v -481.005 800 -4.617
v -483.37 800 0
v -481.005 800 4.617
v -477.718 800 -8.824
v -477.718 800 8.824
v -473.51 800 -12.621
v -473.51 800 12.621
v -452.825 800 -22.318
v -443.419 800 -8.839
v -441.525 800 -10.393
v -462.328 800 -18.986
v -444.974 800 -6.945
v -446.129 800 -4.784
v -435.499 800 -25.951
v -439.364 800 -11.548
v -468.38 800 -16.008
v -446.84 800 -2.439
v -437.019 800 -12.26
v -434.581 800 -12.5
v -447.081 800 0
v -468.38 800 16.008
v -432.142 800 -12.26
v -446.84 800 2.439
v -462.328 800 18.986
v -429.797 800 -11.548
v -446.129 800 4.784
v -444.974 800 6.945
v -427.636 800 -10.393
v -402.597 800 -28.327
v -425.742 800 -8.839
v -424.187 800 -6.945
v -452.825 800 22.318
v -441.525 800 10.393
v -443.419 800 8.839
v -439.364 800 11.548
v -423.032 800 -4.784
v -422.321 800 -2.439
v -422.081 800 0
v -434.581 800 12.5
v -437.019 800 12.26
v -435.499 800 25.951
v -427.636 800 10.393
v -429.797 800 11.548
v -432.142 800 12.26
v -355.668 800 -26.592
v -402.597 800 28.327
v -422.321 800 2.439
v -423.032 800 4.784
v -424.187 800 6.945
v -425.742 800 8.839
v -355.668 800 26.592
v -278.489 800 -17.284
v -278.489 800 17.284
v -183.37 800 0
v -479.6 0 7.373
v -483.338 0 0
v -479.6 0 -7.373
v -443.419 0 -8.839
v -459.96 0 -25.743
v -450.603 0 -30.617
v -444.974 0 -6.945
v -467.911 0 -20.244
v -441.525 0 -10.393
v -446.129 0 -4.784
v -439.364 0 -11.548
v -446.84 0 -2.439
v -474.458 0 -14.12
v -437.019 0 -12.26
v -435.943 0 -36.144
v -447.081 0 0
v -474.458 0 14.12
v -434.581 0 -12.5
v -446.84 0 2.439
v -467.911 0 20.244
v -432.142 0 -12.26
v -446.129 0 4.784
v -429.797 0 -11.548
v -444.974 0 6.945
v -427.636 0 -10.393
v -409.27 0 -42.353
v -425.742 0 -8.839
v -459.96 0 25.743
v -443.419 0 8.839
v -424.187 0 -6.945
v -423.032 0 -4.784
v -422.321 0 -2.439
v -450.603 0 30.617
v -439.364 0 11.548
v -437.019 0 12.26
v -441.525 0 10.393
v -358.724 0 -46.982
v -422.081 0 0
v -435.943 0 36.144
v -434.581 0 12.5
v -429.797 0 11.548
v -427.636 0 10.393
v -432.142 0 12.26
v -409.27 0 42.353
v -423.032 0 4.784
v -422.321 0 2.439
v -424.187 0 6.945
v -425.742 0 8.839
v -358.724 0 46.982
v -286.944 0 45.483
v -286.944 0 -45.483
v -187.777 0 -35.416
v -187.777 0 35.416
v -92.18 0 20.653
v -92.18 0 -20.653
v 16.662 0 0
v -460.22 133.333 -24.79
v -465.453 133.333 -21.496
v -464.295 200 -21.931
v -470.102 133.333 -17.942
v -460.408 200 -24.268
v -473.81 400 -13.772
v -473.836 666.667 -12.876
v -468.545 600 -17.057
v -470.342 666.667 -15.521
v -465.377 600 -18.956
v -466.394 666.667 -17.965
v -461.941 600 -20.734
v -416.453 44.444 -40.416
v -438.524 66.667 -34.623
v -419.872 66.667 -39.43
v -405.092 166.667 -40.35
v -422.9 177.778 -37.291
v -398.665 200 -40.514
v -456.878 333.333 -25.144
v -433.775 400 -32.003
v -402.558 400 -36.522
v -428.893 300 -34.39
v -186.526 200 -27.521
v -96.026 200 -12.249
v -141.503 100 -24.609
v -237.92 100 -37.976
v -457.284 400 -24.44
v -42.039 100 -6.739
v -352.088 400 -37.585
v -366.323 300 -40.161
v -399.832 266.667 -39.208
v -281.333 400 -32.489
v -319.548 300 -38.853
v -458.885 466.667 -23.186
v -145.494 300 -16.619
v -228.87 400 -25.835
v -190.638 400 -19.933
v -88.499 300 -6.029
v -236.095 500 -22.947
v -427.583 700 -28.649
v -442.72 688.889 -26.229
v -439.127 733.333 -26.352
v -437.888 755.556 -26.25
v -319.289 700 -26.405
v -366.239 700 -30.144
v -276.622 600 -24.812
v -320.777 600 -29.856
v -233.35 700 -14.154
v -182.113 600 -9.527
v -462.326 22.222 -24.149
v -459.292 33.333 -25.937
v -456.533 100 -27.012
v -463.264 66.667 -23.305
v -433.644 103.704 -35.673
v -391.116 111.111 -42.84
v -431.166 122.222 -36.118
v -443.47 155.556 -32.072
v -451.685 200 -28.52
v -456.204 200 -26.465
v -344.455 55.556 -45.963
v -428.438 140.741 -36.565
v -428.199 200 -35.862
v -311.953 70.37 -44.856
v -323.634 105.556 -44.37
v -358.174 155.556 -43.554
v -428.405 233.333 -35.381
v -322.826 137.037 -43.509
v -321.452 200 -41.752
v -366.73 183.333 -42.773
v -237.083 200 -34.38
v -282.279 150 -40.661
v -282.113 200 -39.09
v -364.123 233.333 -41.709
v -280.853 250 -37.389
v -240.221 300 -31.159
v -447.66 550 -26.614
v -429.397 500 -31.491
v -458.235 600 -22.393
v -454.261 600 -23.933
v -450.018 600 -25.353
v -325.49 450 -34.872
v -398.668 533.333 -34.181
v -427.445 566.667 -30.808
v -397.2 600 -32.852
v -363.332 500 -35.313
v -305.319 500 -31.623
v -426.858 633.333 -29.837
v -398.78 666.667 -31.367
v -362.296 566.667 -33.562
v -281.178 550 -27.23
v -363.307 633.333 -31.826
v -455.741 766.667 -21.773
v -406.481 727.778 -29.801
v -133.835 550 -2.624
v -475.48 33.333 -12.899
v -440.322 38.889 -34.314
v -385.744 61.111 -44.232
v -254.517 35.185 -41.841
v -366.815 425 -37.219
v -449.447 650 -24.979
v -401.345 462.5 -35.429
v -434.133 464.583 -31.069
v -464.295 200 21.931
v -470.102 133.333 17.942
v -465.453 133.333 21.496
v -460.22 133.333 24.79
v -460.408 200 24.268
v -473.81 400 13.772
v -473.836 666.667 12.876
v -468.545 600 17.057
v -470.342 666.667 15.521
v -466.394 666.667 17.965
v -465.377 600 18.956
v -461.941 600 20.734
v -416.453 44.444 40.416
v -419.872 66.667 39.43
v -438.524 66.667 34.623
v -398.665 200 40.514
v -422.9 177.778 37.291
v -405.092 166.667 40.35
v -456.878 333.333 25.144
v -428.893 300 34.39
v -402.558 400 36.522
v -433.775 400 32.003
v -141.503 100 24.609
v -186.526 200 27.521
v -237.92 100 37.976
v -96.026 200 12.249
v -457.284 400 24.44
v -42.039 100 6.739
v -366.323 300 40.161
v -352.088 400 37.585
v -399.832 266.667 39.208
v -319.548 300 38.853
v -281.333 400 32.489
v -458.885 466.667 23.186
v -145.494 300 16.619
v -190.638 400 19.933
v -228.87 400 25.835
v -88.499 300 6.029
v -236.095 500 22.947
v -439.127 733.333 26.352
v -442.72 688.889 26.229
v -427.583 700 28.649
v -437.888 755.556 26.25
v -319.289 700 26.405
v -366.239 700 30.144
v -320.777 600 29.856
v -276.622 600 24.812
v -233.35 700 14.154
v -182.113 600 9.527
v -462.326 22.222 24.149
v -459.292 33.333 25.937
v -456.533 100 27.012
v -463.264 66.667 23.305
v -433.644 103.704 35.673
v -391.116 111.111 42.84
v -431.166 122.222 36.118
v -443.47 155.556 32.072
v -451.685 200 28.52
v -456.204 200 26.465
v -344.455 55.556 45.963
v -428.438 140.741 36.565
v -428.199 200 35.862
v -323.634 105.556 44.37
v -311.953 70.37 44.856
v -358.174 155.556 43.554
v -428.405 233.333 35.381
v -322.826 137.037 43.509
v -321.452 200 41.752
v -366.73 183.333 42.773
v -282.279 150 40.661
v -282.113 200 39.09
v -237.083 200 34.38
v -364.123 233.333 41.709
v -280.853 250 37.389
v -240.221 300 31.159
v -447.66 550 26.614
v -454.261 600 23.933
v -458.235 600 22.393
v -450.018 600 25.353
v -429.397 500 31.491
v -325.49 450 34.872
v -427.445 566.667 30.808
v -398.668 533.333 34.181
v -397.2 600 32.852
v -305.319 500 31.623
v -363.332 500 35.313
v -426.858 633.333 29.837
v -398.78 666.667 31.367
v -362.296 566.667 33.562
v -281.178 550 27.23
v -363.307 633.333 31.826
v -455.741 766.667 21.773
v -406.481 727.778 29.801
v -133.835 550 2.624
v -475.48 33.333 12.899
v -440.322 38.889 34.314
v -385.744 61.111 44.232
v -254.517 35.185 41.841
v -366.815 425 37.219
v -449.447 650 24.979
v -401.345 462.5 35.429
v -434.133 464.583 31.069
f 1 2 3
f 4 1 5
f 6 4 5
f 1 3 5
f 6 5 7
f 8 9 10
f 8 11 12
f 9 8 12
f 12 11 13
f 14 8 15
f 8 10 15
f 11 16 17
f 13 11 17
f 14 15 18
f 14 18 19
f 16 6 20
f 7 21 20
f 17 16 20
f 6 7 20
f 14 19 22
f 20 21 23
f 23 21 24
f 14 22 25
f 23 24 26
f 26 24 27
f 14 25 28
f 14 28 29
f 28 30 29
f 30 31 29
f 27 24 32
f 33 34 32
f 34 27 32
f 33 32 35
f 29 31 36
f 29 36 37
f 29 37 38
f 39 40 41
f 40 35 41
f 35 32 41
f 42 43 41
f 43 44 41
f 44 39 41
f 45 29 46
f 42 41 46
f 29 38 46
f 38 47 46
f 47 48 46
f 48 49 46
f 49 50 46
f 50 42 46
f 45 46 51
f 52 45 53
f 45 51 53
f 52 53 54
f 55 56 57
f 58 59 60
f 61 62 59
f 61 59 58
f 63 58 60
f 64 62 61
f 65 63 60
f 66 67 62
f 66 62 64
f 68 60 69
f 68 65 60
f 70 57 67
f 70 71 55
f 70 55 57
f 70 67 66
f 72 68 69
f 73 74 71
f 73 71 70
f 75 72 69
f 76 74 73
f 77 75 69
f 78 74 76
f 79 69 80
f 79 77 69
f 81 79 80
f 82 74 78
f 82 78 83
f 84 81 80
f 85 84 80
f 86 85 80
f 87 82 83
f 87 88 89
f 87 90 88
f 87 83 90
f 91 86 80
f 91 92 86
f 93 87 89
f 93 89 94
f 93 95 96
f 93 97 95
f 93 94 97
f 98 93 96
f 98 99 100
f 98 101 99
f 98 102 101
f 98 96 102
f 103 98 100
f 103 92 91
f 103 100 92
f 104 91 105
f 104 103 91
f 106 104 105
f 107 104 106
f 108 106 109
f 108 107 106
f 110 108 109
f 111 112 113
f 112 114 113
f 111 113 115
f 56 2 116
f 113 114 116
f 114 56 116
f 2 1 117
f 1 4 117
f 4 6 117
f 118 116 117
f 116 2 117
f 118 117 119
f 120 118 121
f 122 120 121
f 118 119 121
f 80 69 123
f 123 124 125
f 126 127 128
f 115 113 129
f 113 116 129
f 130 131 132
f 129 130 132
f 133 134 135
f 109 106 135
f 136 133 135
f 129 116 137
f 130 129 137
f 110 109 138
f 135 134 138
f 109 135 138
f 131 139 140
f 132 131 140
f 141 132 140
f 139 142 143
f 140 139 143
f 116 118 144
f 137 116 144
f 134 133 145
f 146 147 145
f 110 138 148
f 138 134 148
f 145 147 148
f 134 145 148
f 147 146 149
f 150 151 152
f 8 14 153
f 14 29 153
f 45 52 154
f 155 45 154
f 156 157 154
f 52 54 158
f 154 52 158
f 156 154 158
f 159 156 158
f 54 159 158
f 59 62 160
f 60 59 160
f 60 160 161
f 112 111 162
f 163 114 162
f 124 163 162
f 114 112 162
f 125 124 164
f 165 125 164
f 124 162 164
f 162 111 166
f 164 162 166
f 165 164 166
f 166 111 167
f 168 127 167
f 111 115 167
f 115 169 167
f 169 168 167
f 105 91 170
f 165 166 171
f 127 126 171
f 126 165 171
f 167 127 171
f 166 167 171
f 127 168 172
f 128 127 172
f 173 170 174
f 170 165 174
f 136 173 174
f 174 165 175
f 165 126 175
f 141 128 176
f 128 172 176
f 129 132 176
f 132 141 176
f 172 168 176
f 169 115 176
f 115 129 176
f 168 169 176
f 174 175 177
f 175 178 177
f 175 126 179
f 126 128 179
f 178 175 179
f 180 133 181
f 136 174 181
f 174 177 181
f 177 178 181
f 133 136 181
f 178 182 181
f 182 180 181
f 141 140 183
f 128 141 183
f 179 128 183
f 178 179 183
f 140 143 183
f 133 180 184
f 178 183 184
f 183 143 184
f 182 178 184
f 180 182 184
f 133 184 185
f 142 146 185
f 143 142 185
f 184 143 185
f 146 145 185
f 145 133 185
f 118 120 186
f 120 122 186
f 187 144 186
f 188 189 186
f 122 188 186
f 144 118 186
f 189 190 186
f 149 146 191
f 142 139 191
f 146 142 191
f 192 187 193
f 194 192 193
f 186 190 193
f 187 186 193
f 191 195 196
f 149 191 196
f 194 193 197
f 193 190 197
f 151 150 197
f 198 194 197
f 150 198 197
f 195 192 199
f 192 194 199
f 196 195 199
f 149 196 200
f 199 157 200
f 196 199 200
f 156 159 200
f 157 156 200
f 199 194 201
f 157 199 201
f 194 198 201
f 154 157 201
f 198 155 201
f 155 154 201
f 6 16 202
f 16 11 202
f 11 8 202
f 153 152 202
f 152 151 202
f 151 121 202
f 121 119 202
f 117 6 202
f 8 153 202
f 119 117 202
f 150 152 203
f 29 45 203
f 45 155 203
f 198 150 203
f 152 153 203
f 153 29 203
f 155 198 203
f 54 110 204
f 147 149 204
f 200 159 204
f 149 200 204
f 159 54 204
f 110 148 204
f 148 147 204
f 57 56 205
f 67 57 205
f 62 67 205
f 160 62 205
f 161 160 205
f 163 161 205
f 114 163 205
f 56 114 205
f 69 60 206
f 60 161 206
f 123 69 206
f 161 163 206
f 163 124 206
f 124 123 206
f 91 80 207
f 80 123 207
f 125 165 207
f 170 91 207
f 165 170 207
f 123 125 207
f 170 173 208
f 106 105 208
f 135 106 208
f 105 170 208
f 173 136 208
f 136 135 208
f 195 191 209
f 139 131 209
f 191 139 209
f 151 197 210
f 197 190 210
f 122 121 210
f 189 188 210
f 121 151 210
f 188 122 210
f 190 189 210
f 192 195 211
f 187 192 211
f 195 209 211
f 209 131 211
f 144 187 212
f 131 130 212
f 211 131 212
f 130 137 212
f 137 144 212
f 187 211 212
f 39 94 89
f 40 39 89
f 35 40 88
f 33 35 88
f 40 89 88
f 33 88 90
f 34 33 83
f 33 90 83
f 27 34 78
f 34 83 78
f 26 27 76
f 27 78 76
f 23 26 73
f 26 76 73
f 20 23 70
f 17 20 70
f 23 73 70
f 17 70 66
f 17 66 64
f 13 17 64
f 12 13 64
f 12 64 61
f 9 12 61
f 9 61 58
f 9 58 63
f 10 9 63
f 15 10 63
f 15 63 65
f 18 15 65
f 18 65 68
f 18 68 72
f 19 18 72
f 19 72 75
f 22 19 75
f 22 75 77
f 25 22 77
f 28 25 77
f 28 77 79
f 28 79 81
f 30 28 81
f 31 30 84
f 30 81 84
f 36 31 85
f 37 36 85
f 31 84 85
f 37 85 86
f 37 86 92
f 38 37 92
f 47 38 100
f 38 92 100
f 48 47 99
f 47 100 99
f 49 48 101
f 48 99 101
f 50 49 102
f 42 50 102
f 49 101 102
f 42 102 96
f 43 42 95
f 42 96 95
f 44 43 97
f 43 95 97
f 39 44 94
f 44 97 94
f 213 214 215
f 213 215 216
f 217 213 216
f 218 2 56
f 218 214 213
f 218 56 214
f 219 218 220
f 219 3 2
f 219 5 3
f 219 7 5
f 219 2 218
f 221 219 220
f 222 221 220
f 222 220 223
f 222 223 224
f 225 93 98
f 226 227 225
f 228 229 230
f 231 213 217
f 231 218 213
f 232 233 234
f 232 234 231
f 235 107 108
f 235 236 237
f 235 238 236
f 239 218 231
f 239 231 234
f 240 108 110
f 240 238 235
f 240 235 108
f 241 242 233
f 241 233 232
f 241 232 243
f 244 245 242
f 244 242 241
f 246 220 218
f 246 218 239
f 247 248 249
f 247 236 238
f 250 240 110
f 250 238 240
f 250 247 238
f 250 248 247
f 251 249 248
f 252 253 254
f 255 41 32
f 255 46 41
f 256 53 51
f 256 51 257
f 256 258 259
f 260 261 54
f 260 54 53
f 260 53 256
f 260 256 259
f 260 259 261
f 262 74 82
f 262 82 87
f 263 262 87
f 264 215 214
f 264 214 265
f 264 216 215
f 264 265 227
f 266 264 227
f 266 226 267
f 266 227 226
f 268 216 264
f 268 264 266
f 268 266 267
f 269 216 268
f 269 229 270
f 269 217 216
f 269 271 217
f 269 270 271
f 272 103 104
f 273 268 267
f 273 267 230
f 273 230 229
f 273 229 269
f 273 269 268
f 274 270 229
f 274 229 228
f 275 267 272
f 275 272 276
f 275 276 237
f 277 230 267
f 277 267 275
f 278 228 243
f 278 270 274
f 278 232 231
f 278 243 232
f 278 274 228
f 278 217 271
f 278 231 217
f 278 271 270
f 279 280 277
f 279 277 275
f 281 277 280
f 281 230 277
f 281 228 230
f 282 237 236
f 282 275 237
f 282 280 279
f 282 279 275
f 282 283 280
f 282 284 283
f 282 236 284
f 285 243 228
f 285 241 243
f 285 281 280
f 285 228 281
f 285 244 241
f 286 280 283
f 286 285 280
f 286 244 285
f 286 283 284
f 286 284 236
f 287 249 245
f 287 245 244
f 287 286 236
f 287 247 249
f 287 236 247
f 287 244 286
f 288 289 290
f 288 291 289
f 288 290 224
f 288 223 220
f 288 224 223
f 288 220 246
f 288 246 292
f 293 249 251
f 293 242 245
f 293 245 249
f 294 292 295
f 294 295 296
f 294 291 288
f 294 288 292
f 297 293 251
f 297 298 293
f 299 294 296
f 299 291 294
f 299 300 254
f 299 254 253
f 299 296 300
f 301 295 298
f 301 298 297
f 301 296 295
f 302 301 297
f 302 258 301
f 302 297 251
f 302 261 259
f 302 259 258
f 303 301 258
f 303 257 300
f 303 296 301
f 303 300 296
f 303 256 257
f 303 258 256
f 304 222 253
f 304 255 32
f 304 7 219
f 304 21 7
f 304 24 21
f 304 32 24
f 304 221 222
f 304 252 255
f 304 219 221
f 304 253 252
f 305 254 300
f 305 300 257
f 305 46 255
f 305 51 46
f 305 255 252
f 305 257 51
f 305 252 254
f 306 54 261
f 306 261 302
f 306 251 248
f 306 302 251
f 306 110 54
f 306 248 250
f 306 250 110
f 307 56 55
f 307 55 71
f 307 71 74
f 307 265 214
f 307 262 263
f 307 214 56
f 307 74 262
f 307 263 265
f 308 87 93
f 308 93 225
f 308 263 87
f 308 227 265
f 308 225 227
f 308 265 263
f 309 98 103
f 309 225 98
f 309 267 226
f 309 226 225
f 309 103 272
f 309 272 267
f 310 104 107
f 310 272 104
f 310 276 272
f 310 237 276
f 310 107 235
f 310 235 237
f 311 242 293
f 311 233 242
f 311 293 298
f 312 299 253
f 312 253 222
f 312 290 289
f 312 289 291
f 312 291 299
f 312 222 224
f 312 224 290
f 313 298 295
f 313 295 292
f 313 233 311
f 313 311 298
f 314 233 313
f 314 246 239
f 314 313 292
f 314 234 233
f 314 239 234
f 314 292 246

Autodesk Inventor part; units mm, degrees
ref_plane "YZ Plane" through (0, 0, 0) normal (1, 0, 0) x (0, 1, 0)
ref_plane "XY Plane" through (0, 0, 0) normal (0, 0, 1) x (1, 0, 0)
sketch "ground" plane through (0, 0, 0) normal (0, 1, 0) x (-1, 0, 0)
  line L0 (483.3377, 0) -> (445.9963, 94.5527) construction
  line L1 (445.9963, 94.5527) -> (-16.6623, 0) construction
  spline S0 degree 2 poles (483.3377, 0) (445.9963, 94.5527) (-16.6623, 0) knots 1 1 1 2 2 2
  line L2 (483.3377, 0) -> (-16.6623, 0)
  point P0 (0, 0)
  dimension "d0" = 500
  dimension "d21" = 100
  dimension "d22" = 68.45
ref_plane "Arbeitsebene1" through (0, 800, 0) normal (0, 1, 0) x (-1, 0, 0)
sketch "Skizze3" plane through (0, 800, 0) normal (0, 1, 0) x (-1, 0, 0)
  line L0 (483.3697, 0) -> (460.9649, 56.7316) construction
  line L1 (460.9649, 56.7316) -> (183.3697, 0) construction
  spline S0 degree 2 poles (483.3697, 0) (460.9649, 56.7316) (183.3697, 0) knots 1 1 1 2 2 2
  line L2 (483.3697, 0) -> (183.3697, 0)
  point P0 (0, 0)
  dimension "d27" = 300
  dimension "d28" = 100
  dimension "d29" = 68.45
sketch "Skizze5" plane through (0, 800, 0) normal (0, 1, 0) x (-1, 0, 0)
  circle A0 centre (434.5806, 0) radius 12.3812
  point P0 (0, 0)
loft "Erhebung2" add profiles "ground", "Skizze3"
mirror "Spiegeln2" about plane through (16.6623, 0, 0) normal (0, 0, -1) of "Erhebung2"
hole "Bohrung1" at (-434.5806, 800, 0) direction (0, -1, 0) diameter 25 end through all
properties part number "mb_sail"
